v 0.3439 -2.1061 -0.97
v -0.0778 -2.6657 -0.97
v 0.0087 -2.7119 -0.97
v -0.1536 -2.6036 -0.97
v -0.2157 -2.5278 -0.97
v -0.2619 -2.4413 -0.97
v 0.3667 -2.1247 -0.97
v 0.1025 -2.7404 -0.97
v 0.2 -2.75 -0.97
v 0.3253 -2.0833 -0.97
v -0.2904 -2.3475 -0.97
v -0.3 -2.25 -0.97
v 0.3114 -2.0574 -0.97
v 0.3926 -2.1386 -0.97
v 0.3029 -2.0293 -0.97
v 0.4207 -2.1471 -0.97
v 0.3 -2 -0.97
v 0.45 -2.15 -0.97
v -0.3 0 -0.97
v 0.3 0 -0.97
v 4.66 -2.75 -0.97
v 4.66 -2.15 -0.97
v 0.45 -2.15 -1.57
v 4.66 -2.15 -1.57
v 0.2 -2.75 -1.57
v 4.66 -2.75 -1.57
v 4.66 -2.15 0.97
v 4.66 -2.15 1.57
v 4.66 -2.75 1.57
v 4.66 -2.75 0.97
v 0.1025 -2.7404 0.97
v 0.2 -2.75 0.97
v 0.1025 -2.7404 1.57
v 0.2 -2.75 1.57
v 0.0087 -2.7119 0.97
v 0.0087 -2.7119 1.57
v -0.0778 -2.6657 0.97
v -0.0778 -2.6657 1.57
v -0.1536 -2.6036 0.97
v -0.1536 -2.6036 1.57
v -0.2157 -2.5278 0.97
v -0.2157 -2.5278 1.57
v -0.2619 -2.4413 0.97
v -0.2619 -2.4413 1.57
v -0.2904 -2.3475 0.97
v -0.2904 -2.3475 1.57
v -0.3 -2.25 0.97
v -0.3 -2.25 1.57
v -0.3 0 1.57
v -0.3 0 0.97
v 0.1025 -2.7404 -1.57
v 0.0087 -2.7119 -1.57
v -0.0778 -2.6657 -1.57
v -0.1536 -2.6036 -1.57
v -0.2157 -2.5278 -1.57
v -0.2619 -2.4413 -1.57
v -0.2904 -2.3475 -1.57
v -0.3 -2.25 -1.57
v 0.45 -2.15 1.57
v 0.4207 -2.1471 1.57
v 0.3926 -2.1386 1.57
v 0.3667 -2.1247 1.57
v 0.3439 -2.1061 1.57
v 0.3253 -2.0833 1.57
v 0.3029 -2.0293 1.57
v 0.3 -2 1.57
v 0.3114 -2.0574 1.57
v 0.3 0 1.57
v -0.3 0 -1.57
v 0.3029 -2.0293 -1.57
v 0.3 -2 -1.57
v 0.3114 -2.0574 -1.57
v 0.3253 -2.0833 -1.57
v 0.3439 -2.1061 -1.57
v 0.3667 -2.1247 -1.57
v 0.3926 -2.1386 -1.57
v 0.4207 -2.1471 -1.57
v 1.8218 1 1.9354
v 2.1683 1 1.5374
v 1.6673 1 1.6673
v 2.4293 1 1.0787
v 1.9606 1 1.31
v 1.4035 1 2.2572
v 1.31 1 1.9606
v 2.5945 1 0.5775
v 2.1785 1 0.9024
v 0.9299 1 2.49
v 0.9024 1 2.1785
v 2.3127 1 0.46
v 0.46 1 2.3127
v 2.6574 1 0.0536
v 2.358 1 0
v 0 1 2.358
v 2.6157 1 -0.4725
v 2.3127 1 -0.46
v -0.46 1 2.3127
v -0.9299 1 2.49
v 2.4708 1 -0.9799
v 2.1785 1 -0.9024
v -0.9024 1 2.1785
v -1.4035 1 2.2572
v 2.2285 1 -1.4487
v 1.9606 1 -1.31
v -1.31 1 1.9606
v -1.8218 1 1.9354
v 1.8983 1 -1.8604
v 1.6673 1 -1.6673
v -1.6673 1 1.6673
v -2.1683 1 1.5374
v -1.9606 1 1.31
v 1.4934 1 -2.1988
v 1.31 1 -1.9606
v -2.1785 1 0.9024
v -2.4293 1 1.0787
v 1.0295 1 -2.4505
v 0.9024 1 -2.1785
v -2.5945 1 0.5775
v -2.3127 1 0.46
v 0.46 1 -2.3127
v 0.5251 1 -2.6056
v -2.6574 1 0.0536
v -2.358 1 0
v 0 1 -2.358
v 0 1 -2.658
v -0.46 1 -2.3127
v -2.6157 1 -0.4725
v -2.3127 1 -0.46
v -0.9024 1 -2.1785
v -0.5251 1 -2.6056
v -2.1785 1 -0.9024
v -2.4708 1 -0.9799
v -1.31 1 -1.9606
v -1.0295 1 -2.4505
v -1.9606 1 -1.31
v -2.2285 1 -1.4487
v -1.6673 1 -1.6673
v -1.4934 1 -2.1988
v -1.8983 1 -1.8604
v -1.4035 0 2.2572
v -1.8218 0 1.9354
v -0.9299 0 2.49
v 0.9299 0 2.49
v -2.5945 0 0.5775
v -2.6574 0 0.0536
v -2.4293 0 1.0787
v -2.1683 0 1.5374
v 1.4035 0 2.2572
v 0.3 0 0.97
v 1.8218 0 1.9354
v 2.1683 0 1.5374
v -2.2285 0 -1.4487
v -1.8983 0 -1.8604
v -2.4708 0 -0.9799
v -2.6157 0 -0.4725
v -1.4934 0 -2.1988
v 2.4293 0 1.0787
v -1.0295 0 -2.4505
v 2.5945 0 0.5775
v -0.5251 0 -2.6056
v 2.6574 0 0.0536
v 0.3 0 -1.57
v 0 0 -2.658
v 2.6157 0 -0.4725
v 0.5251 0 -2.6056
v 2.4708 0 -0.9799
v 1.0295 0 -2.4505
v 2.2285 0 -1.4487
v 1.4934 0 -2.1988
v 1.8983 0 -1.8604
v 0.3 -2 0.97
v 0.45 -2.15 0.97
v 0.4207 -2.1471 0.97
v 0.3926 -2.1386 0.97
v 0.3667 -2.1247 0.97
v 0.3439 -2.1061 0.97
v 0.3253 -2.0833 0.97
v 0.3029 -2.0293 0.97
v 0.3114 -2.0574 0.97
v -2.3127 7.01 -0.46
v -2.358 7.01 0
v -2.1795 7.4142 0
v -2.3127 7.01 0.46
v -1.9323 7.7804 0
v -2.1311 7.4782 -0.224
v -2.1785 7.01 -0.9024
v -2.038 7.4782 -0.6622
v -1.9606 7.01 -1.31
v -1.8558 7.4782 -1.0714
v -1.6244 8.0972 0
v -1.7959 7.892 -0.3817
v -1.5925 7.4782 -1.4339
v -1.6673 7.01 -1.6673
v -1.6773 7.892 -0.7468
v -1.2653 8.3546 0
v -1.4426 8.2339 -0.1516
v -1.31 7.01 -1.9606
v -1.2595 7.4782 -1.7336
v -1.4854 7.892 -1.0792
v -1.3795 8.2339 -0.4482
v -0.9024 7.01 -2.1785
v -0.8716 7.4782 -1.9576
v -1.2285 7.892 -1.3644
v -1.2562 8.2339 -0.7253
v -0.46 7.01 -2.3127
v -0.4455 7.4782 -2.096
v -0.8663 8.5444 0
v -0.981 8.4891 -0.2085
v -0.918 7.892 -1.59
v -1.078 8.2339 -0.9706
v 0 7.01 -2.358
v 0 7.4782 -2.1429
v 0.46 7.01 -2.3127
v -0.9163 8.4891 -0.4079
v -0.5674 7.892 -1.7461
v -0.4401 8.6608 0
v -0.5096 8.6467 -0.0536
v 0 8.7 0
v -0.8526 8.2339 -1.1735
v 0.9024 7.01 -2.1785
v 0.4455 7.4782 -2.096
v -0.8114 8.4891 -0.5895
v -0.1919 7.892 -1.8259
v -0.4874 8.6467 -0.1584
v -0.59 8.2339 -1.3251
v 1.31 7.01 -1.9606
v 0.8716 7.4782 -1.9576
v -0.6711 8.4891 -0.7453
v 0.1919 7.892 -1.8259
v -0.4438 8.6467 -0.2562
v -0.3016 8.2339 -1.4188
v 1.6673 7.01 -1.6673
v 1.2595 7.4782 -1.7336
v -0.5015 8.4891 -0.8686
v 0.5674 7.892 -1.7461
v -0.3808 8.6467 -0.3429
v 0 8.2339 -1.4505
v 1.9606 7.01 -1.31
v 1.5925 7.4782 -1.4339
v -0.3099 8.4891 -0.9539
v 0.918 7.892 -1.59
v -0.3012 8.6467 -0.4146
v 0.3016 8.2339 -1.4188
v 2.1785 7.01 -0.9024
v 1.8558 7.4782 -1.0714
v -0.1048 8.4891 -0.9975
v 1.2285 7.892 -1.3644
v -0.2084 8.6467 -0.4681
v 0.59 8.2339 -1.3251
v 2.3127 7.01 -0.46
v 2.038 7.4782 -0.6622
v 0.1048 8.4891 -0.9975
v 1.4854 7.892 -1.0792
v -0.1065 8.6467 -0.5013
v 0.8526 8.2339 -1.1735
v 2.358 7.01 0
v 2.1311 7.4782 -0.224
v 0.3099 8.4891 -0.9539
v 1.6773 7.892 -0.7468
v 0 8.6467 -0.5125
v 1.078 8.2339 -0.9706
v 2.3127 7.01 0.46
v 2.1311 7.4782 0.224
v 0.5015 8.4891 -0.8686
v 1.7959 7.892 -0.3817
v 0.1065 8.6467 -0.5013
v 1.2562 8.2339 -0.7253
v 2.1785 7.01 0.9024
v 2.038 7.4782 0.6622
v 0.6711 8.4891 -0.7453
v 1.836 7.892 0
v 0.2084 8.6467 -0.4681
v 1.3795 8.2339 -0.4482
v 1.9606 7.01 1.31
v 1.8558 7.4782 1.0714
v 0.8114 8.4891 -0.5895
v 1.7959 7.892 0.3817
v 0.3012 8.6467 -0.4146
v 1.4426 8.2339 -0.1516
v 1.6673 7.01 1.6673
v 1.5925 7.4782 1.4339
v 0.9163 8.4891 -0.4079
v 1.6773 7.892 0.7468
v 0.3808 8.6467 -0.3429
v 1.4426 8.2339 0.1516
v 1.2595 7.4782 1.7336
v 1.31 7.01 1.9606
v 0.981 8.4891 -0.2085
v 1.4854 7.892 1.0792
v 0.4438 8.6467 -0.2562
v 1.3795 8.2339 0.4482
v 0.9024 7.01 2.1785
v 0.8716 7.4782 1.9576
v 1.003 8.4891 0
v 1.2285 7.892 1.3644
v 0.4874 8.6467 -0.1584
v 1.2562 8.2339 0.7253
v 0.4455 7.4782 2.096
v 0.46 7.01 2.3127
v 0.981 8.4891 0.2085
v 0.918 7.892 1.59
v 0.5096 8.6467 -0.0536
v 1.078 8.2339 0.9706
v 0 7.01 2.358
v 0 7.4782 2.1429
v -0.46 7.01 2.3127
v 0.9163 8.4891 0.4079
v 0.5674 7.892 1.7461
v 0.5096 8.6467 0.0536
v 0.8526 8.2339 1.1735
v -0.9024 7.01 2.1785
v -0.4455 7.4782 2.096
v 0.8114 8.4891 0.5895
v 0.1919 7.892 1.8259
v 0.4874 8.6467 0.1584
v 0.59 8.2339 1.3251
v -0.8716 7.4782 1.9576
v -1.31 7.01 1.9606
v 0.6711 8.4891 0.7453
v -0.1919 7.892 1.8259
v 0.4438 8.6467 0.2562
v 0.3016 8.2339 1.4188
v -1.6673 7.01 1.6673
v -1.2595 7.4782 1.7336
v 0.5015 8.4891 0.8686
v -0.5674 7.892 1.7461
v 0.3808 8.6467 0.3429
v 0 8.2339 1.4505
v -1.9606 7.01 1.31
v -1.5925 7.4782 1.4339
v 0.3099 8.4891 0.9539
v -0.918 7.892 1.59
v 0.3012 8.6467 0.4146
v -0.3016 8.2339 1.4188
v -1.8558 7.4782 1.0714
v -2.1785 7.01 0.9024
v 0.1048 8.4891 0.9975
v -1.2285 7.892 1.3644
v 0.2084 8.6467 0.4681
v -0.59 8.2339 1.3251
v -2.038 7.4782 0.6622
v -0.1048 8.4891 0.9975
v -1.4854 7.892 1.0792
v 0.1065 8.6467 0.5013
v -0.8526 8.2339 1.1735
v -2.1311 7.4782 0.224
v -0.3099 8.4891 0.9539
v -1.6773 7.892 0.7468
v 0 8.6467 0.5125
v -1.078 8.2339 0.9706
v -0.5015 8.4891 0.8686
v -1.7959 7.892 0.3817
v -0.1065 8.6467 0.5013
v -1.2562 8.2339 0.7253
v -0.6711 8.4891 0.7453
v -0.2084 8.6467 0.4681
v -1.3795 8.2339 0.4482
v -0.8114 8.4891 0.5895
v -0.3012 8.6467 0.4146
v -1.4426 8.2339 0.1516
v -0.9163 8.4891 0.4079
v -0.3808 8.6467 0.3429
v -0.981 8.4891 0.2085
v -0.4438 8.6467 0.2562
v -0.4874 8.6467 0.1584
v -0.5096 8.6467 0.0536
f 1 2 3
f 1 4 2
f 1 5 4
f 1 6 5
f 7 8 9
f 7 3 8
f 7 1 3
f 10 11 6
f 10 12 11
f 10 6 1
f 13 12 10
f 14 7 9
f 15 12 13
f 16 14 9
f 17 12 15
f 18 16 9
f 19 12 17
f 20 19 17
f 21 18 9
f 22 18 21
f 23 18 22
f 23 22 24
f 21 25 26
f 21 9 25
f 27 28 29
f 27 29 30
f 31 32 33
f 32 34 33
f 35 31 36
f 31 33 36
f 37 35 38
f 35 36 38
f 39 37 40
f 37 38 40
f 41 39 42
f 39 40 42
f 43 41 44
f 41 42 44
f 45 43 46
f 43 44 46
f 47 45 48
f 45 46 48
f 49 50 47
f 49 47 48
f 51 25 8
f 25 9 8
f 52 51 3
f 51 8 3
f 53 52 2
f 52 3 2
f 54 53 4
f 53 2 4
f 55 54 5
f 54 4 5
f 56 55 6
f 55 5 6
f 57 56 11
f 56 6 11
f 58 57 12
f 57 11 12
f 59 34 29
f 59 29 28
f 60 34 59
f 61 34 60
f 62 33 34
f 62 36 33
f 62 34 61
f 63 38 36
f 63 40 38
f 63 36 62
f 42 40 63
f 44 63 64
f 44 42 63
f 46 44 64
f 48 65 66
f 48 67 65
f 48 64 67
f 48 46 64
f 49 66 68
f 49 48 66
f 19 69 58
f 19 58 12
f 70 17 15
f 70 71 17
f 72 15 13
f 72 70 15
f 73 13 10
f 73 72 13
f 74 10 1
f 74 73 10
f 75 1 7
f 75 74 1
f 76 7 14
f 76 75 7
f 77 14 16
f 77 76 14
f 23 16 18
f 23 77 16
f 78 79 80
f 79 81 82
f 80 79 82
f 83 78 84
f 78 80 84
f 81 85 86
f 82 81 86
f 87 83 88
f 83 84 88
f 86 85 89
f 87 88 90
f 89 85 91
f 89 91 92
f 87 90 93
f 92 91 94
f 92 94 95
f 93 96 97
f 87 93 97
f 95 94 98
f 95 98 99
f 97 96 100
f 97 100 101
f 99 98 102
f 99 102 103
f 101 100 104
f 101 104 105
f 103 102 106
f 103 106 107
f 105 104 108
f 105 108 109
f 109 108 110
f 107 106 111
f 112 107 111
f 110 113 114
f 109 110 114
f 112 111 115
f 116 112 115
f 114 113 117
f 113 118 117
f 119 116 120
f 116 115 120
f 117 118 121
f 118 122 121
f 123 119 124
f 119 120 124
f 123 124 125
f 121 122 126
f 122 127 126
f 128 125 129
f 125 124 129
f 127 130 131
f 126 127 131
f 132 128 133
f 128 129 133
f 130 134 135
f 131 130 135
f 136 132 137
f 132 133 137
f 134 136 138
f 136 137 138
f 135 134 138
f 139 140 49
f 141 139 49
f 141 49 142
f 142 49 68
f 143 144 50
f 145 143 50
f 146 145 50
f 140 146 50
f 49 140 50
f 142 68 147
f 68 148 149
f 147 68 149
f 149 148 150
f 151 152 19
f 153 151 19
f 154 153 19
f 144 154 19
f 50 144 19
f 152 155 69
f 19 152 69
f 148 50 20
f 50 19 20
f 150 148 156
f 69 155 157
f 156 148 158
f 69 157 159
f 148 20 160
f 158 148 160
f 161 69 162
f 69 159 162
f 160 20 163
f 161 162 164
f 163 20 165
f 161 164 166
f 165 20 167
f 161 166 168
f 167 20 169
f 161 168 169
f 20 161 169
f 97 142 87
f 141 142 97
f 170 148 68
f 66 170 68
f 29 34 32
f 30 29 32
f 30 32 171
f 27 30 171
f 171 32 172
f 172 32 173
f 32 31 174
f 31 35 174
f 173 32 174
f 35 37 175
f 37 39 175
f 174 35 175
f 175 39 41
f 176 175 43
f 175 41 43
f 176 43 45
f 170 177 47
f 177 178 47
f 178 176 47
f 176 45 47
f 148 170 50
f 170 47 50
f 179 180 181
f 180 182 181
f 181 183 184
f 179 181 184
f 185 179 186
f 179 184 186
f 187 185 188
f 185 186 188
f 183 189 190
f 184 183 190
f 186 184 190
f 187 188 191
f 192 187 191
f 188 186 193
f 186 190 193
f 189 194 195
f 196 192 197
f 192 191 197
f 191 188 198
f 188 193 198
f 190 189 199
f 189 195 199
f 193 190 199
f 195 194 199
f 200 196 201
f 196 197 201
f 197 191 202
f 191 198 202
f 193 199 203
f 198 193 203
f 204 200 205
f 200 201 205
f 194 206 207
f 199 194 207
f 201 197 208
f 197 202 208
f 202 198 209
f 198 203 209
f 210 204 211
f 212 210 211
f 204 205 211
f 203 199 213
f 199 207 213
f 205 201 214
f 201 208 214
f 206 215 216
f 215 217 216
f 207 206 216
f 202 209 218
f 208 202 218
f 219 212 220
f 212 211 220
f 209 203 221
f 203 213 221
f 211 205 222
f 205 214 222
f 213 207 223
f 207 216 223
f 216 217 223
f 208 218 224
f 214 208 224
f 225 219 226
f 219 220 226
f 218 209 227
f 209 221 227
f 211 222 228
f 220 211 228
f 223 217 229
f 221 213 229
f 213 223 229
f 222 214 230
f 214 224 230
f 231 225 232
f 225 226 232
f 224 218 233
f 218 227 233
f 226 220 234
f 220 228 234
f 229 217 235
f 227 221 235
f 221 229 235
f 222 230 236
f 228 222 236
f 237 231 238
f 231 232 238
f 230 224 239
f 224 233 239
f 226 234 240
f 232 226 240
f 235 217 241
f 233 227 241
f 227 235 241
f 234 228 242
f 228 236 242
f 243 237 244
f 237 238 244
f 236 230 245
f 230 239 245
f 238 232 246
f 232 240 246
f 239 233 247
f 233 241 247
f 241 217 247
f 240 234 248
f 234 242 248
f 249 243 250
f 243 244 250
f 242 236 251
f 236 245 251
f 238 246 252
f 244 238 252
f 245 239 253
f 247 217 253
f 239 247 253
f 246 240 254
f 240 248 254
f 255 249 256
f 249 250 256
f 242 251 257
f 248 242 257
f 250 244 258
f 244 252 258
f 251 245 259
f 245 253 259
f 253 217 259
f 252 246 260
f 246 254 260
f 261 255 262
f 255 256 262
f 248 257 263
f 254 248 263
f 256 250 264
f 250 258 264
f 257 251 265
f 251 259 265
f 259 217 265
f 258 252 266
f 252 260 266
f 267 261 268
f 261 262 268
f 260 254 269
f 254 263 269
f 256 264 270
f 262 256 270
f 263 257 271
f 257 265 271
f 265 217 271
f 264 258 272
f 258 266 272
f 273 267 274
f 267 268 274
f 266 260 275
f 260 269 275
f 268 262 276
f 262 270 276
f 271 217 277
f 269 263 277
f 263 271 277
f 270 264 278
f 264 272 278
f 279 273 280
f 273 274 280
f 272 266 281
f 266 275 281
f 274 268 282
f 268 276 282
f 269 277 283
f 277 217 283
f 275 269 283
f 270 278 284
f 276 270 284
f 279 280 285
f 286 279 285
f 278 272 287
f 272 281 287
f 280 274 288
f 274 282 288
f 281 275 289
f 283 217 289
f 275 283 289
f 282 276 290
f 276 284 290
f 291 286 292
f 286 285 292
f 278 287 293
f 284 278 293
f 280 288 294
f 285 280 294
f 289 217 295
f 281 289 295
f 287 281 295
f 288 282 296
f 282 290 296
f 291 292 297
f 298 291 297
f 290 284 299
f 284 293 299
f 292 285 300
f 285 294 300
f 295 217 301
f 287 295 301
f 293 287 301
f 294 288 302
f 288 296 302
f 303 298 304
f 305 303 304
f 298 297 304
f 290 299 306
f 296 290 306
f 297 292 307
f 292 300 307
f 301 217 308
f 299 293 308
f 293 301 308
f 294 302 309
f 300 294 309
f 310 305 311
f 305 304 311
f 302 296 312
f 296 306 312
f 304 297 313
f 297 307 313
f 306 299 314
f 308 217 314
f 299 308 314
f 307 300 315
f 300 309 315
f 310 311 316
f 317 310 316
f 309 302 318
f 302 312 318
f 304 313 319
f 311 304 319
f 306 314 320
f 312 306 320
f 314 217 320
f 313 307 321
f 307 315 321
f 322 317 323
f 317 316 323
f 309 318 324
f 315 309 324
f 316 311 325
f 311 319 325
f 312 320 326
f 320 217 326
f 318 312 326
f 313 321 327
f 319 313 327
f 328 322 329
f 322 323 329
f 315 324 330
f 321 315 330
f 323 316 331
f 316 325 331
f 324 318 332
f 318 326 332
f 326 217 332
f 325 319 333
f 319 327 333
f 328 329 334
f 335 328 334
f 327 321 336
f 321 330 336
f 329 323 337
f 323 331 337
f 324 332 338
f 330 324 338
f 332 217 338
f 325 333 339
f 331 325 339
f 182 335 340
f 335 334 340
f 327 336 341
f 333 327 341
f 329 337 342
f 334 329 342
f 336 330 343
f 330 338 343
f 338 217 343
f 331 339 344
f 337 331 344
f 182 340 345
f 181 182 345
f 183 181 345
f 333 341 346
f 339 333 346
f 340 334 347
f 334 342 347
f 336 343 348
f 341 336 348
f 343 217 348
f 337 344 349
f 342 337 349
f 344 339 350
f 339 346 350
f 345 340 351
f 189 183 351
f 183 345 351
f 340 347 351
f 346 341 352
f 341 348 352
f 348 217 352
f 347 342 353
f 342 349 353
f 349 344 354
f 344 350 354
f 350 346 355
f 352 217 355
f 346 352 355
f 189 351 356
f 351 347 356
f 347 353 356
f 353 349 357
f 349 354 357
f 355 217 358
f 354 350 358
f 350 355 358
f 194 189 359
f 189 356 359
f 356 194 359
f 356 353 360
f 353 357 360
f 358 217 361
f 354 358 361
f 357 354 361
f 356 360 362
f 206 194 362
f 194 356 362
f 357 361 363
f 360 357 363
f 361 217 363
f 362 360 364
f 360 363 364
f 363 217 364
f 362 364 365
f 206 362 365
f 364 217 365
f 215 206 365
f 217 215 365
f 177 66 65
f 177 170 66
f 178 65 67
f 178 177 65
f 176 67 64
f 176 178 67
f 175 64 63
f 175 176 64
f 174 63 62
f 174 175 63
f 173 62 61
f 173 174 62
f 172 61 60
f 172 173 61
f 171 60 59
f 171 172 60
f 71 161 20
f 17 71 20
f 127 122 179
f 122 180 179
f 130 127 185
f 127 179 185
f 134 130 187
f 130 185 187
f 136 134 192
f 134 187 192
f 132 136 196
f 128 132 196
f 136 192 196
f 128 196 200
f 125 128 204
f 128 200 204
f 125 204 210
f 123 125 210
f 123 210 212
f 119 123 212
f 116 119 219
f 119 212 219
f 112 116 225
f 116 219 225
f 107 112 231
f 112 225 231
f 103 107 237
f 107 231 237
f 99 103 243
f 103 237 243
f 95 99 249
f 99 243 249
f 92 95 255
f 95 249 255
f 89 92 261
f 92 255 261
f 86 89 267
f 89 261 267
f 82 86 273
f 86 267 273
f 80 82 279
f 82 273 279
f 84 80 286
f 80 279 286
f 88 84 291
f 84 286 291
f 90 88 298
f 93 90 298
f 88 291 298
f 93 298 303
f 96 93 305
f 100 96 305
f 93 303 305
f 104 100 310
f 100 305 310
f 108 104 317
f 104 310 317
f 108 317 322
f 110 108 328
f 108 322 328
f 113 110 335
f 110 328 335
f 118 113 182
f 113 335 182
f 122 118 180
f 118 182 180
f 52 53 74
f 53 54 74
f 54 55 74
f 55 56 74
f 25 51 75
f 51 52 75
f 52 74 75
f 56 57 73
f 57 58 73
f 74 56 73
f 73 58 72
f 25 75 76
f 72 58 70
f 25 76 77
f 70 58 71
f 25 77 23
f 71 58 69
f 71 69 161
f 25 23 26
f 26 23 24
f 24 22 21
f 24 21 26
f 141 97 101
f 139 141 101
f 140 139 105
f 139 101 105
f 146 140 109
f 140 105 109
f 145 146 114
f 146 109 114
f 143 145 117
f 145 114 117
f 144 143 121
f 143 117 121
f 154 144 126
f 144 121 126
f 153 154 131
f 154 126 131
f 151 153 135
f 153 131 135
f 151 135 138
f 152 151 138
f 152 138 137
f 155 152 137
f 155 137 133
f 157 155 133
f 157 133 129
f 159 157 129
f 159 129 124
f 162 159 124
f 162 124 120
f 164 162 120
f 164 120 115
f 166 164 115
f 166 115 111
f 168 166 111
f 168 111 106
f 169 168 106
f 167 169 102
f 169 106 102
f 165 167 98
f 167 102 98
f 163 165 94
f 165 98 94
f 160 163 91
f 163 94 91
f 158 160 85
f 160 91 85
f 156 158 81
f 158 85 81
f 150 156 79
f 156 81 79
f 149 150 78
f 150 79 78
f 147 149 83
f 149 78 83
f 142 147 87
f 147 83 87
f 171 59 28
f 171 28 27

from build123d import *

# Parameters (mm, degrees)
IZIM2_W                     = 2
IZIM2_H                     = 0.3
KES_EKSTR_ZYON3_DEPTH       = 10
IZIM3_W                     = 0.6
IZIM3_H                     = 0.6
Y_KSEKLIK_EKSTR_ZYON1_DEPTH = 2.75
IZIM4_W                     = 0.6
IZIM4_H                     = 0.6
Y_KSEKLIK_EKSTR_ZYON2_DEPTH = 4.36
RADYUS1_R                   = 0.5
RADYUS2_R                   = 0.15
RADYUS3_R                   = 0.15


with BuildPart() as part:
    # Çizim1 → Döndür1 (revolve)
    with BuildSketch(Plane.XY, mode=Mode.PRIVATE) as d_nd_r1_sk:
        with BuildLine():
            Line((2.357986429, 1), (2.357986429, 7.01))
            ThreePointArc((2.357986429, 7.01), (1.450534384, 8.233870055), (0, 8.7))
            Line((0, 8.7), (0, 1))
            Line((0, 1), (2.357986429, 1))
        make_face()
        Polygon((2.657986429, 1), (2.357986429, 1), (0, 1), (0, 0), (2.657986429, 0), align=None)
    revolve(d_nd_r1_sk.sketch.rotate(Axis((0, 8.7, 0), (0, -1, 0)), 180), axis=Axis((0, 8.7, 0), (0, -1, 0)))

    # Çizim2 → Kes-Ekstrüzyon3 (cut)
    with BuildSketch(Plane(origin=(0, 0, 0), x_dir=(-1, 0, 0), z_dir=(0, -1, 0))):
        with Locations((-0.070058143, -2.64)):
            Rectangle(IZIM2_W, IZIM2_H)
    extrude(amount=-KES_EKSTR_ZYON3_DEPTH, mode=Mode.SUBTRACT)

    # Çizim3 → Yükseklik-Ekstrüzyon1 (add)
    with BuildSketch(Plane.XZ):
        with Locations((0, 1.27)):
            Rectangle(IZIM3_W, IZIM3_H)
        with Locations((0, -1.27)):
            Rectangle(IZIM3_W, IZIM3_H)
    extrude(amount=Y_KSEKLIK_EKSTR_ZYON1_DEPTH)

    # Çizim4 → Yükseklik-Ekstrüzyon2 (add)
    with BuildSketch(Plane(origin=(0.3, 0, 0), x_dir=(0, 0, -1), z_dir=(1, 0, 0))):
        with Locations((-1.27, -2.45)):
            Rectangle(IZIM4_W, IZIM4_H)
        with Locations((1.27, -2.45)):
            Rectangle(IZIM4_W, IZIM4_H)
    extrude(amount=Y_KSEKLIK_EKSTR_ZYON2_DEPTH)

    # Radyus1
    radyus1_edges = [part.edges().sort_by_distance(p)[0] for p in [
        (-0.3, -2.75, 1.27),
        (-0.3, -2.75, -1.27),
    ]]
    fillet(radyus1_edges, radius=RADYUS1_R)

    # Radyus2
    radyus2_edges = [part.edges().sort_by_distance(p)[0] for p in [
        (0.3, -2.15, -1.27),
    ]]
    fillet(radyus2_edges, radius=RADYUS2_R)

    # Radyus3
    radyus3_edges = [part.edges().sort_by_distance(p)[0] for p in [
        (0.3, -2.15, 1.27),
    ]]
    fillet(radyus3_edges, radius=RADYUS3_R)


solid = part.part
